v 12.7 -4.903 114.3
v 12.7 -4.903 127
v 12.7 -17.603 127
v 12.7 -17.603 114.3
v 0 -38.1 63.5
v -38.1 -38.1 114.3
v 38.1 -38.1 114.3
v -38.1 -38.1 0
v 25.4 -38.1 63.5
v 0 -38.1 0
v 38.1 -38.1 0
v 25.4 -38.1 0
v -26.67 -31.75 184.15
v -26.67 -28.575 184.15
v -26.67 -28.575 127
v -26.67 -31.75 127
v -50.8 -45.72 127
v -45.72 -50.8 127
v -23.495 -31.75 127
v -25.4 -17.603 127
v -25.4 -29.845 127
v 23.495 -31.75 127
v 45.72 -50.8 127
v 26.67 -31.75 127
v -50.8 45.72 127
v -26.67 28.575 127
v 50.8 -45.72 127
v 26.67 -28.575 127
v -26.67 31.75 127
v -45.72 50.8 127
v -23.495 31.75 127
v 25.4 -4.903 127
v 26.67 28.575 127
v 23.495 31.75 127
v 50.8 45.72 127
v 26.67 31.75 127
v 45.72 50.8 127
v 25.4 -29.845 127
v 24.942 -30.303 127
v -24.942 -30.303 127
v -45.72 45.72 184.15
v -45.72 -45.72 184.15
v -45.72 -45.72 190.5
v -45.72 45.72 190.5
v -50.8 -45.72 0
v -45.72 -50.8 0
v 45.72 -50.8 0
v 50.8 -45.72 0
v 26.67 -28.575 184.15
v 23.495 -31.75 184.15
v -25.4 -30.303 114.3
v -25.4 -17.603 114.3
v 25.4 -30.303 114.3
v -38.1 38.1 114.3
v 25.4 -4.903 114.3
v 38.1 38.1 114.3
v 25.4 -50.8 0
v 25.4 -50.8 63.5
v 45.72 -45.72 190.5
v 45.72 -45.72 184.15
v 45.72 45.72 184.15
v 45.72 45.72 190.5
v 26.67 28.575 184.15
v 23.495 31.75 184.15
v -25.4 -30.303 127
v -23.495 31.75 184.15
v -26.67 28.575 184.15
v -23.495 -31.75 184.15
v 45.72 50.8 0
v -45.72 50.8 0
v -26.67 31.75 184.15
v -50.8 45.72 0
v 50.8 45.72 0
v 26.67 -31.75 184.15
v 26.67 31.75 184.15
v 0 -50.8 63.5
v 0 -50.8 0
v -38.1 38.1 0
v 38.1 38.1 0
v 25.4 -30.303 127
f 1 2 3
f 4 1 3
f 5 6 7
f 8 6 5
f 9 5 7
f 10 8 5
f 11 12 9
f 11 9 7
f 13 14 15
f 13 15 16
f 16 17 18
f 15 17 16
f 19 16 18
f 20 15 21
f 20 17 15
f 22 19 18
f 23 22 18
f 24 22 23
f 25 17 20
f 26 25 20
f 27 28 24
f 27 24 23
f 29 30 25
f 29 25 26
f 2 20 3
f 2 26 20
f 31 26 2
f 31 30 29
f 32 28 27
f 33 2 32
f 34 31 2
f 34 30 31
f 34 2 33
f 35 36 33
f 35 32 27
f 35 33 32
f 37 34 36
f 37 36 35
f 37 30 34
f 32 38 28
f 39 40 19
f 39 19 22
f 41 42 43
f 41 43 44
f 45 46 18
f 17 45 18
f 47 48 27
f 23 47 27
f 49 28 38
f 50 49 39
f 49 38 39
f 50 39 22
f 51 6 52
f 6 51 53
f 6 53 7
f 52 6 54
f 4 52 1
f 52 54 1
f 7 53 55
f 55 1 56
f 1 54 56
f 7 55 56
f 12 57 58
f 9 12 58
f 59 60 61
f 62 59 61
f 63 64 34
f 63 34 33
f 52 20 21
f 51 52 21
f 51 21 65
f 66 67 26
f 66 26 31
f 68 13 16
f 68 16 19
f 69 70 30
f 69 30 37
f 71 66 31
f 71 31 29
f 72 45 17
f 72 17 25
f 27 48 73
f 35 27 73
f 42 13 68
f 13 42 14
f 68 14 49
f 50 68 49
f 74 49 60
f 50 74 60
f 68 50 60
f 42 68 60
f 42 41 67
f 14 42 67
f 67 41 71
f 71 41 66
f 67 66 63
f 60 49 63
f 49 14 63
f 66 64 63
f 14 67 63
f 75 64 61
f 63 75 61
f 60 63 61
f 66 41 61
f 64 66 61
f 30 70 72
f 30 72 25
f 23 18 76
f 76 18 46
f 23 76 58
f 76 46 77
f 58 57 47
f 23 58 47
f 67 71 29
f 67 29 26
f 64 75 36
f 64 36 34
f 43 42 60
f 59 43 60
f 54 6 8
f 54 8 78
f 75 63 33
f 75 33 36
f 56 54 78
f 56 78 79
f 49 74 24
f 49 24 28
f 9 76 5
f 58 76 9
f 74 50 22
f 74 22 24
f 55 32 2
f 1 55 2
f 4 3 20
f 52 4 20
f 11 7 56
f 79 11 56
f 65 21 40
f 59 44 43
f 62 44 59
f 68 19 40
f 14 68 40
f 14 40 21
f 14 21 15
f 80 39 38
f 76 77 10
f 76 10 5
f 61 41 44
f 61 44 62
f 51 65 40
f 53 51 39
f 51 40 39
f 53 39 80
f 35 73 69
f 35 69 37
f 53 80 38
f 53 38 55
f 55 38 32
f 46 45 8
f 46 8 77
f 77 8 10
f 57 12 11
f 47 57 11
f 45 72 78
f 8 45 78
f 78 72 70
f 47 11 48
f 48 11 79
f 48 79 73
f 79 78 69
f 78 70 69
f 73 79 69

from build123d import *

# Parameters (mm, degrees)
F0_W      = 101.6
F0_H      = 101.6
F0_W_2    = 76.2
F0_H_2    = 76.2
F1_DEPTH  = 127
F2_W      = 25.4
F2_H      = 63.5
F3_DEPTH  = 25.4
F4_W      = 76.2
F4_H      = 12.7
F5_DEPTH  = 77.724
F7_DEPTH  = 25.4
F9_DEPTH  = 57.15
F10_W     = 91.44
F10_H     = 91.44
F11_DEPTH = 6.35
F12_SIZE2 = 5.08
F12_SIZE  = 5.08


with BuildPart() as f1:
    # F0 (on Top) → F1 (new body)
    with BuildSketch(Plane.XY):
        Rectangle(F0_W, F0_H)
        Rectangle(F0_W_2, F0_H_2, mode=Mode.SUBTRACT)
    extrude(amount=F1_DEPTH)

    # F2 (on face) → F3 (cut)
    with BuildSketch(Plane.XZ.offset(50.8)):
        with Locations((12.7, 31.75)):
            Rectangle(F2_W, F2_H)
    extrude(amount=-F3_DEPTH, mode=Mode.SUBTRACT)

    # F4 (on face) → F5 (join)
    with BuildSketch(Plane.XZ.offset(-38.1)):
        with Locations((0, 120.65)):
            Rectangle(F4_W, F4_H)
    extrude(amount=F5_DEPTH)

    # F6 (on face) → F7 (cut)
    with BuildSketch(Plane.XY.offset(127)):
        Polygon((-25.4, -17.603385), (-25.4, -30.303385), (25.4, -30.303385), (25.4, -17.603385), (25.4, -4.903385), (12.7, -4.903385), (12.7, -17.603385), align=None)
    extrude(amount=-F7_DEPTH, mode=Mode.SUBTRACT)

    # F8 (on face) → F9 (join)
    with BuildSketch(Plane.XY.offset(127)):
        Polygon((-23.495, -31.75), (-26.67, -28.575), (-26.67, -31.75), align=None)
        Polygon((-26.67, 28.575), (-23.495, 31.75), (-26.67, 31.75), align=None)
        Polygon((26.67, -28.575), (23.495, -31.75), (26.67, -31.75), align=None)
        Polygon((23.495, 31.75), (26.67, 28.575), (26.67, 31.75), align=None)
    extrude(amount=F9_DEPTH)

    # F10 (on face) → F11 (join)
    with BuildSketch(Plane.XY.offset(184.15)):
        Rectangle(F10_W, F10_H)
    extrude(amount=F11_DEPTH)

    # F12
    f12_edges = [f1.edges().sort_by_distance(p)[0] for p in [
        (50.8, -50.8, 63.5),
        (-50.8, -50.8, 63.5),
        (50.8, 50.8, 63.5),
        (-50.8, 50.8, 63.5),
    ]]
    chamfer(f12_edges, length=F12_SIZE, length2=F12_SIZE2)


solid = f1.part
